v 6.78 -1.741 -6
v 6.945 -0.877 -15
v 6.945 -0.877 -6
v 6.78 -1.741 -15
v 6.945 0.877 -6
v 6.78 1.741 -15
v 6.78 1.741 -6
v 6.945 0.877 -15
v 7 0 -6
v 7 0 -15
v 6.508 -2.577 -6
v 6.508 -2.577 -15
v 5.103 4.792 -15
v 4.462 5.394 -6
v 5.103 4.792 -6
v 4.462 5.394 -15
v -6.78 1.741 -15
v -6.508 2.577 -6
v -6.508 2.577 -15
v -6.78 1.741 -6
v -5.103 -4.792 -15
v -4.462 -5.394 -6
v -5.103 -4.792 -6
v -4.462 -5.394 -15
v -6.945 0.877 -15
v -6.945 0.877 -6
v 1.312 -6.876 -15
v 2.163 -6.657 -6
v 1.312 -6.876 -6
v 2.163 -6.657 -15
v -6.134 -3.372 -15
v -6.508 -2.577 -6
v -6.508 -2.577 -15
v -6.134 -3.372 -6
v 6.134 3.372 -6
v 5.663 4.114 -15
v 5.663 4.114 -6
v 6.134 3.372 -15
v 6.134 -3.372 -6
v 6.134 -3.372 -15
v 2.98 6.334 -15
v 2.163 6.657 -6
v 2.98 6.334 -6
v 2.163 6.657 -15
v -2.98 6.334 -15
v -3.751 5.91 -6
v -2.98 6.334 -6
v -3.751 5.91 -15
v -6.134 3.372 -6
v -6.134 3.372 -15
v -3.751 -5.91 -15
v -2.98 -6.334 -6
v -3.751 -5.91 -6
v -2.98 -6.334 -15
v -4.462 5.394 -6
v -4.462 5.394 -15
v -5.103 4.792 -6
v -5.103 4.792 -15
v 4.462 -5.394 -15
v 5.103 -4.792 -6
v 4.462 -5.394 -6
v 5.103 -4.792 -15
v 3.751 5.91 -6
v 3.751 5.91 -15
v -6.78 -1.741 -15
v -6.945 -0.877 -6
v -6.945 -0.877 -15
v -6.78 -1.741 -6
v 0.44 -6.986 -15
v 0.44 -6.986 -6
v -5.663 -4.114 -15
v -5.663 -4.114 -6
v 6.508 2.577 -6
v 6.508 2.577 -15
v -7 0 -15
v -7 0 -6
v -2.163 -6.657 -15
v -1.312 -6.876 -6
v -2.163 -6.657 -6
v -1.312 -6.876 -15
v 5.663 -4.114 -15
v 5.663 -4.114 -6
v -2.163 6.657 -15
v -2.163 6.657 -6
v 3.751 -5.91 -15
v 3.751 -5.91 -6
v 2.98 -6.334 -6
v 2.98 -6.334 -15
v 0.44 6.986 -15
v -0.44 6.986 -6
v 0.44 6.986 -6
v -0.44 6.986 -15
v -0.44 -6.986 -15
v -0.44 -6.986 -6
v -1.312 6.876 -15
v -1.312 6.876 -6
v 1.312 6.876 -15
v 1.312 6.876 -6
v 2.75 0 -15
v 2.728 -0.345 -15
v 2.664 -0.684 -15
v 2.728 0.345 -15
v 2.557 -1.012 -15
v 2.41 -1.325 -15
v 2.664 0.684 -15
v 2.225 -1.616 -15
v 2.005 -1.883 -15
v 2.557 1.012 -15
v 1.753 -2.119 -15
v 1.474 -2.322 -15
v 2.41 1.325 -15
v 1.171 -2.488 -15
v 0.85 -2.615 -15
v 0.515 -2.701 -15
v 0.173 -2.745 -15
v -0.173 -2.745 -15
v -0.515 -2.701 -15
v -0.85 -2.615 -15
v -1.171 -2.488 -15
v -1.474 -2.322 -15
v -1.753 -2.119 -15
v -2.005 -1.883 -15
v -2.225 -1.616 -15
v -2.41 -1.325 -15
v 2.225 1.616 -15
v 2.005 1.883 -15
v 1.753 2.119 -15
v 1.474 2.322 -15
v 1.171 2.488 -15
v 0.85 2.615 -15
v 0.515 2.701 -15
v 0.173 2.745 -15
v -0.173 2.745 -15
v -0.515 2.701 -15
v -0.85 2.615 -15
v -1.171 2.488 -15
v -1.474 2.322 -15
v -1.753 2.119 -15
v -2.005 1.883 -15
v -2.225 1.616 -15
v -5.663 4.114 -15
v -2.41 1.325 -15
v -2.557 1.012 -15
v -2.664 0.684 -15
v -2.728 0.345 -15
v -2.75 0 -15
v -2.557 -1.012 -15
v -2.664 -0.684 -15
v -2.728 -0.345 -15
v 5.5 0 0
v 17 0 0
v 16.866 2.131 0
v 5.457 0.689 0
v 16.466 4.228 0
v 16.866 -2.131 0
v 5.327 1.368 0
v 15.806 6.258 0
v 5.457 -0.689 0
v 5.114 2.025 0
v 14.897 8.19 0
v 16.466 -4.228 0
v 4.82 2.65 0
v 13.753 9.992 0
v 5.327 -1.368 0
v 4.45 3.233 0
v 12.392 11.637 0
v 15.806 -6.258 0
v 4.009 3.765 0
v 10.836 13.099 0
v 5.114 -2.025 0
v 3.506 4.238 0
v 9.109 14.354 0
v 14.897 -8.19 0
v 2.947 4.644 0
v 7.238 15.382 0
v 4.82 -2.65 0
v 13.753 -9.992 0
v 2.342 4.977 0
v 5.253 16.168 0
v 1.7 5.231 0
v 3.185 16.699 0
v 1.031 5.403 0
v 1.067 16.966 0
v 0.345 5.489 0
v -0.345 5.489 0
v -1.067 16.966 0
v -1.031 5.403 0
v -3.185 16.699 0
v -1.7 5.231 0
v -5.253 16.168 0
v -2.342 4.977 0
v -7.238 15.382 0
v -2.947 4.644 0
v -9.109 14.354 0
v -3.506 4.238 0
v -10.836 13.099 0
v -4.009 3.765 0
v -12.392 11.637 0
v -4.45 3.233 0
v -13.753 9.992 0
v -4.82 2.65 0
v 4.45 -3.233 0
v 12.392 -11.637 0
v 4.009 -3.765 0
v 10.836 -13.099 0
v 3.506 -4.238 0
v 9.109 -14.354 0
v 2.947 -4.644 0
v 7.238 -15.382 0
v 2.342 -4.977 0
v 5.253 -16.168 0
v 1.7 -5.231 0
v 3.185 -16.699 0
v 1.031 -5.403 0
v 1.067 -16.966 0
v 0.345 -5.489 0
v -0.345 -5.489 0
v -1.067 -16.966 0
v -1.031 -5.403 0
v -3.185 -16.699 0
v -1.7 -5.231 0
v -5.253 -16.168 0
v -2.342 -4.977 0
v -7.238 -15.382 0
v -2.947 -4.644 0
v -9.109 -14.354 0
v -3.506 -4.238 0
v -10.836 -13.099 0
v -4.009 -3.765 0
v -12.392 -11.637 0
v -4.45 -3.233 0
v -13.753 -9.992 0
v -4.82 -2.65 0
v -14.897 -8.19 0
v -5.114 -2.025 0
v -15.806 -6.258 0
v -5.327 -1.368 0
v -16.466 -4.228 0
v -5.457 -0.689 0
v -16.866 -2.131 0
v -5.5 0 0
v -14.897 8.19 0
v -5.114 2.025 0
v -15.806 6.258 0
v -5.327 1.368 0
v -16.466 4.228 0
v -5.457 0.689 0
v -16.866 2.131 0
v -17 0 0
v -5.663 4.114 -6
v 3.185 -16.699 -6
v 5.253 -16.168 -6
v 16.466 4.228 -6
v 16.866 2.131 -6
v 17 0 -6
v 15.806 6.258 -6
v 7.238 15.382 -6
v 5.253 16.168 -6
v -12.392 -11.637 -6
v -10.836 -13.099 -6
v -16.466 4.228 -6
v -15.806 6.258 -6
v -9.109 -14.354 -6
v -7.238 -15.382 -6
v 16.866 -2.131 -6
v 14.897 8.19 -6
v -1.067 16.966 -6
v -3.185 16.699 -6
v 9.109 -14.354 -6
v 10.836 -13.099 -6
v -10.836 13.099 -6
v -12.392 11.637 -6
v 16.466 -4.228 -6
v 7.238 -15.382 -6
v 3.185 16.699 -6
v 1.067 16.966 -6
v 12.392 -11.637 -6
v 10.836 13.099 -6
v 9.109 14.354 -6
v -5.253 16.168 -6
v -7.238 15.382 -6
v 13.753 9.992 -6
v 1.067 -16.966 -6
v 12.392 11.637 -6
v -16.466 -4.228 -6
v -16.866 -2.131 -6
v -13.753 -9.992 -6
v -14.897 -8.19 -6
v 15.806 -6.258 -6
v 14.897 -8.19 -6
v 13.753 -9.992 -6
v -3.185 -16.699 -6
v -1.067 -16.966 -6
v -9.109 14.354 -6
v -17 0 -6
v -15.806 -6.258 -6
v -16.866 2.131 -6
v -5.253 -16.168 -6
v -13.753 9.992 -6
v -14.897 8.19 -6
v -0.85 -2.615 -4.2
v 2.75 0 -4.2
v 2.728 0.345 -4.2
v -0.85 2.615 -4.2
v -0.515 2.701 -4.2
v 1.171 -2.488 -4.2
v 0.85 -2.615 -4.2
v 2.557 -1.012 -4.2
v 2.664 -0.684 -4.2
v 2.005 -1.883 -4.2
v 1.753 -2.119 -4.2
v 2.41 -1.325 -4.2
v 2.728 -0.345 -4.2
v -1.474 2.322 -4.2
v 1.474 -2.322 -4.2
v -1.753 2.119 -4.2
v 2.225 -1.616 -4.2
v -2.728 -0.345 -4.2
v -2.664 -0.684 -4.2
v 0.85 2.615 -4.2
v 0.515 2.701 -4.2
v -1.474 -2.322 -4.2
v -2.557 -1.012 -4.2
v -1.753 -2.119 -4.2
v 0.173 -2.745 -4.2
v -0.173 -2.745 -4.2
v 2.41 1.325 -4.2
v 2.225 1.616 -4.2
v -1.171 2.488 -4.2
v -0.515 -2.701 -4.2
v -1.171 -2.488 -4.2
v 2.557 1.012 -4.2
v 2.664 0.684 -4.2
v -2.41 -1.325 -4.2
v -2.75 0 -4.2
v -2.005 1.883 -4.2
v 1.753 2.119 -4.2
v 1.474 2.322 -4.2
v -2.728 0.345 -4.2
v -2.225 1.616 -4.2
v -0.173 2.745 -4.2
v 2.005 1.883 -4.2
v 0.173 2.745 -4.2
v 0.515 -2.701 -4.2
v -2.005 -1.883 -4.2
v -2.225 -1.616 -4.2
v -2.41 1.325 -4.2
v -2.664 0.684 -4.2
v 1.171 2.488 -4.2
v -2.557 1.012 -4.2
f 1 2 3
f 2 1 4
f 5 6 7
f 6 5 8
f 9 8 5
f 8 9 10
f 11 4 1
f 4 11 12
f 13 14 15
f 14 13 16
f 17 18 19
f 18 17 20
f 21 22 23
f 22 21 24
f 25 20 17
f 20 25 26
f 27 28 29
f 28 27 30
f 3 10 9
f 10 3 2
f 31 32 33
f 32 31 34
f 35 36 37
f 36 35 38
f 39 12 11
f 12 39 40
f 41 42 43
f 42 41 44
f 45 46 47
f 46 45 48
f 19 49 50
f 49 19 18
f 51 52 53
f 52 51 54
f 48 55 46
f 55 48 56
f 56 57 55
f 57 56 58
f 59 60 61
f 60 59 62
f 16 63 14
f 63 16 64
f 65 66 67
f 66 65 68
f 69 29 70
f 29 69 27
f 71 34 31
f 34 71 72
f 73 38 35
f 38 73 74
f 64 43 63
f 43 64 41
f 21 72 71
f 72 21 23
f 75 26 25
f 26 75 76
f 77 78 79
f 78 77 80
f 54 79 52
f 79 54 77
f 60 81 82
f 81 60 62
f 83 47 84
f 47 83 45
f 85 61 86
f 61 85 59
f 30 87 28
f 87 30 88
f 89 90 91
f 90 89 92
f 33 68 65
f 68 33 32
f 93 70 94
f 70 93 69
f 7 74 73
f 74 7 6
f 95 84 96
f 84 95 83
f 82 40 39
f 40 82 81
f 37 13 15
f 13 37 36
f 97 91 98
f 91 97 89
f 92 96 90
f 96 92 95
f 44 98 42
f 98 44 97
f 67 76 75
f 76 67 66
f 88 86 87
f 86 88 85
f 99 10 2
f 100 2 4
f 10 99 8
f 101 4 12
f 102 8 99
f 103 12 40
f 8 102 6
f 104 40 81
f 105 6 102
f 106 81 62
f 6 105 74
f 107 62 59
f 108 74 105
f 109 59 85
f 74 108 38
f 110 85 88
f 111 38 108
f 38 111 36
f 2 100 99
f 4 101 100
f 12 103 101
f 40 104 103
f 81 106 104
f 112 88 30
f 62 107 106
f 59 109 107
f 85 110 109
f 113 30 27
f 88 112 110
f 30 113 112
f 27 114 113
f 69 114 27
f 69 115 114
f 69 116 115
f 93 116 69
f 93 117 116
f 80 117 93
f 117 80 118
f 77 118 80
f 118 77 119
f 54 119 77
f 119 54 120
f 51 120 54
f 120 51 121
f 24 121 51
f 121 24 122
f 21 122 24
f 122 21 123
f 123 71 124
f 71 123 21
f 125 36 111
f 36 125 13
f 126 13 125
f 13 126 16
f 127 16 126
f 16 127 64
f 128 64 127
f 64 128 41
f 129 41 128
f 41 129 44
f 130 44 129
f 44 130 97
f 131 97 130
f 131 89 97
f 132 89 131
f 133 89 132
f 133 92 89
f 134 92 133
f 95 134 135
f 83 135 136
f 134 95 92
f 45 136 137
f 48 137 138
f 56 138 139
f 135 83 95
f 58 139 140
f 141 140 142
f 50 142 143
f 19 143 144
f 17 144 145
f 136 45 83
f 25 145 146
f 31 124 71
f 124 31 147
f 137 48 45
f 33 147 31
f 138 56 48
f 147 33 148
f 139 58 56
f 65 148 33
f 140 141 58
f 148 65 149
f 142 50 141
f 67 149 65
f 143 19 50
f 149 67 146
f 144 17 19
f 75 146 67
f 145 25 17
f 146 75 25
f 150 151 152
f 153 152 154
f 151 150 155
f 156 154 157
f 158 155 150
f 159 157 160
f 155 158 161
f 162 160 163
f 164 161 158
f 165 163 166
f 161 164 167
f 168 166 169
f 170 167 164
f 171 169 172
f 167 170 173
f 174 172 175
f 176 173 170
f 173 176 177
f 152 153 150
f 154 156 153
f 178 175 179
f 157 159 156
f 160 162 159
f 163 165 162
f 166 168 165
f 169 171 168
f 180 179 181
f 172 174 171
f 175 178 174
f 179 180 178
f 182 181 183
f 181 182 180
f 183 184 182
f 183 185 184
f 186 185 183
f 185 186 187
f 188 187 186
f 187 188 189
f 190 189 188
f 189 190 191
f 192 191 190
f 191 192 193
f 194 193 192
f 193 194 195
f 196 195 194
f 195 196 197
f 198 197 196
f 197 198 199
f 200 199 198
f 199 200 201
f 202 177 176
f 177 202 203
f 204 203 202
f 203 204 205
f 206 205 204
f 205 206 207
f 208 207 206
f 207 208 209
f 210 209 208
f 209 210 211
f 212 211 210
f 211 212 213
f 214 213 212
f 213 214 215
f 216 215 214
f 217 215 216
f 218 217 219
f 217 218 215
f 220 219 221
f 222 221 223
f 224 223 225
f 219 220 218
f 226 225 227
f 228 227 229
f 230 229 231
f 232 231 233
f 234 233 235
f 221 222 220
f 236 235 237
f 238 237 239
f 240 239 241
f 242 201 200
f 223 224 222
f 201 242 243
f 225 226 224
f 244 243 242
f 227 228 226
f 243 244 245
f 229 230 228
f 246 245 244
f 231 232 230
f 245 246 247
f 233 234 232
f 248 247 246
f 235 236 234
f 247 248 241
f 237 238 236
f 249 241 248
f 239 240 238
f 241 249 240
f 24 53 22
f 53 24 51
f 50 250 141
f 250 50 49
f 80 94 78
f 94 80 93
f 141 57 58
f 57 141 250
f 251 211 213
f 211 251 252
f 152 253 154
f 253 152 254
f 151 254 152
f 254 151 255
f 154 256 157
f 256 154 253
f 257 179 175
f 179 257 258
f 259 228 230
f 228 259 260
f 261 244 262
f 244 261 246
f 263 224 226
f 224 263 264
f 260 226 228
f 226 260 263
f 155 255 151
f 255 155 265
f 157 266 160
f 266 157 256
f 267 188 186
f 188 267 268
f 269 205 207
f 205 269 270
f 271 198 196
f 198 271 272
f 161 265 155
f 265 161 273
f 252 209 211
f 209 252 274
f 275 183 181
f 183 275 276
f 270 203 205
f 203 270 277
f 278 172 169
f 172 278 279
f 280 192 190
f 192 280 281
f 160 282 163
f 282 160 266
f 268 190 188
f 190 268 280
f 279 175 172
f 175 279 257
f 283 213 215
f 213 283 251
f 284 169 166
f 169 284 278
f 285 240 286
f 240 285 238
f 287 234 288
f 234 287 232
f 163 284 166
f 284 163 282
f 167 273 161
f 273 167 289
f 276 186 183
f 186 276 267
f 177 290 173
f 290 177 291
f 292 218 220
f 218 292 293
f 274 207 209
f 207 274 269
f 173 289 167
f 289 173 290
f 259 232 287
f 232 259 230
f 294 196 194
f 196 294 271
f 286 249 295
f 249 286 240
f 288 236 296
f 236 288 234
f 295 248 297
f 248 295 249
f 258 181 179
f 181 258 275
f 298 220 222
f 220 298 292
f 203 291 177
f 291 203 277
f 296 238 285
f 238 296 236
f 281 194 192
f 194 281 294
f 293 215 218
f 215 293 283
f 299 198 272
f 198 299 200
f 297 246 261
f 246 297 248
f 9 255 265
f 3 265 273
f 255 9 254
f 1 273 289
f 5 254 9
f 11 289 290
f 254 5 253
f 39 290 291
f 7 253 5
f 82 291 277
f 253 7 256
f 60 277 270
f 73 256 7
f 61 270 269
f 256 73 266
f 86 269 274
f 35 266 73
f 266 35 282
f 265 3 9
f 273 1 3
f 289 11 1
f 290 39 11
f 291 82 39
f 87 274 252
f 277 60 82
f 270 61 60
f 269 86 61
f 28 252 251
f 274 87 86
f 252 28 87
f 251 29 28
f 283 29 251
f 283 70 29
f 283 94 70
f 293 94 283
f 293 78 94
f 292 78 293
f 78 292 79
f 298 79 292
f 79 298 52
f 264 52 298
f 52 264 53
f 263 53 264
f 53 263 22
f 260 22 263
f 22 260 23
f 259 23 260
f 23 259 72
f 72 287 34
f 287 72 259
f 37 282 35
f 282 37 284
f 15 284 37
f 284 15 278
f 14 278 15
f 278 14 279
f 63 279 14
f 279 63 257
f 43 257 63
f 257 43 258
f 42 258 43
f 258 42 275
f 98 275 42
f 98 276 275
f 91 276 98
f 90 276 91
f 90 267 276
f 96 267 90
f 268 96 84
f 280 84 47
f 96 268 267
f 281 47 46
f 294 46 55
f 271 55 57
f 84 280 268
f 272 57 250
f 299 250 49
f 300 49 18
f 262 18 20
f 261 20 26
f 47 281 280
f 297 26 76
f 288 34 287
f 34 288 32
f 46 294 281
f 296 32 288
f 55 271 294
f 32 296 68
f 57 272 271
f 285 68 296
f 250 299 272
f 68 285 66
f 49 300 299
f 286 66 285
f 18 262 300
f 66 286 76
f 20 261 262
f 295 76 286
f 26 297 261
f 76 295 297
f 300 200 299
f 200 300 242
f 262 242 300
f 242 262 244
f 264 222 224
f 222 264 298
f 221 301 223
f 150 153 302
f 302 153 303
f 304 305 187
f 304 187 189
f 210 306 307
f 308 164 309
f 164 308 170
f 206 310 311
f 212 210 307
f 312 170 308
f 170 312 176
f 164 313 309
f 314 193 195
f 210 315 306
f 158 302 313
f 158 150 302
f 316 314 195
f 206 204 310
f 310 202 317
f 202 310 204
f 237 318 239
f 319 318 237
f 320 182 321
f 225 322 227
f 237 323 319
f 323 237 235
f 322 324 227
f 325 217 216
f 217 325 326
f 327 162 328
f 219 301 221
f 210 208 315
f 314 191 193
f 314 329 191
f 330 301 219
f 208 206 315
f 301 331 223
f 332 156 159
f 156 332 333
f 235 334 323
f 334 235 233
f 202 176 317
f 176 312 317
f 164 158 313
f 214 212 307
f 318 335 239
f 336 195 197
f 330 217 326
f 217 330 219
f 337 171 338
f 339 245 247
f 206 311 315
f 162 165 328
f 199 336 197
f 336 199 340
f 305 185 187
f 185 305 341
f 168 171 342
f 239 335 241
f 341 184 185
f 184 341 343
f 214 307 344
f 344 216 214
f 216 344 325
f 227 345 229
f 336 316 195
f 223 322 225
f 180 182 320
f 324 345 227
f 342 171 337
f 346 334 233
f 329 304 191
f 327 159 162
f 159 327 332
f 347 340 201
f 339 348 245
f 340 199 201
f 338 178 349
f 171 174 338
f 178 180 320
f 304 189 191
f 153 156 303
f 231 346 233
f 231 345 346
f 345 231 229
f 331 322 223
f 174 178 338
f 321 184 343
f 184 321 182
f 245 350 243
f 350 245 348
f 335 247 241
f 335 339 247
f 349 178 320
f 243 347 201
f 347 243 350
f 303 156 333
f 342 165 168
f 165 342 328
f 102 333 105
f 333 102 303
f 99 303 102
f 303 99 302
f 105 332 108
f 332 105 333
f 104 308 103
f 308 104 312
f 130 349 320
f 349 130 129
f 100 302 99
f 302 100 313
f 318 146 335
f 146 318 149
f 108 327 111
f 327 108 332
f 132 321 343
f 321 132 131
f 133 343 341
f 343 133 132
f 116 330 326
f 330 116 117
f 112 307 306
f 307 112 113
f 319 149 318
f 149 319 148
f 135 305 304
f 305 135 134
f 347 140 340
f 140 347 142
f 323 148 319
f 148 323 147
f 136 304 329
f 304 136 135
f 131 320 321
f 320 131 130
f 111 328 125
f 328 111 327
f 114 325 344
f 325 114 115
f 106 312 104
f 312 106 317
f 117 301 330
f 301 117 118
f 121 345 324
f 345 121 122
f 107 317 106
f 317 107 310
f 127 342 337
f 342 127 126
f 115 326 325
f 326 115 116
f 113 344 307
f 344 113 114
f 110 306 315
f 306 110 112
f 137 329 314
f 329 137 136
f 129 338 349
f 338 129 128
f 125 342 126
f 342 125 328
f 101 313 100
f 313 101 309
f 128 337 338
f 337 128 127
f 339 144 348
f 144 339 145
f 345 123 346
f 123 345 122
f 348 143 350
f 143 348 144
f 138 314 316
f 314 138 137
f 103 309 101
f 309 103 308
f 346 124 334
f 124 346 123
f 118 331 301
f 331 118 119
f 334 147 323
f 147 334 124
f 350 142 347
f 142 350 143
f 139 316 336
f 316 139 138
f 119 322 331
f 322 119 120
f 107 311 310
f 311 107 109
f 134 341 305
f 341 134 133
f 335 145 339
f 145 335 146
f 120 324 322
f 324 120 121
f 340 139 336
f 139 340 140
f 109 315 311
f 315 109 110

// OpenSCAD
$fn = 50;


difference() {
	union() {
		translate(v = [0, 0, -15.0000000000]) {
			cylinder(h = 15, r = 7.0000000000);
		}
		translate(v = [0, 0, -6.0000000000]) {
			cylinder(h = 6, r = 17.0000000000);
		}
	}
	union() {
		translate(v = [0, 0, 0]) {
			rotate(a = [0, 0, 0]) {
				difference() {
					union() {
						#translate(v = [0, 0, -15.0000000000]) {
							cylinder(h = 15, r = 2.2500000000);
						}
						#translate(v = [0, 0, -4.2000000000]) {
							cylinder(h = 4.2000000000, r1 = 2.7500000000, r2 = 5.5000000000);
						}
						#translate(v = [0, 0, -15.0000000000]) {
							cylinder(h = 15, r = 2.7500000000);
						}
						#translate(v = [0, 0, -15.0000000000]) {
							cylinder(h = 15, r = 2.2500000000);
						}
					}
					union();
				}
			}
		}
	}
}
